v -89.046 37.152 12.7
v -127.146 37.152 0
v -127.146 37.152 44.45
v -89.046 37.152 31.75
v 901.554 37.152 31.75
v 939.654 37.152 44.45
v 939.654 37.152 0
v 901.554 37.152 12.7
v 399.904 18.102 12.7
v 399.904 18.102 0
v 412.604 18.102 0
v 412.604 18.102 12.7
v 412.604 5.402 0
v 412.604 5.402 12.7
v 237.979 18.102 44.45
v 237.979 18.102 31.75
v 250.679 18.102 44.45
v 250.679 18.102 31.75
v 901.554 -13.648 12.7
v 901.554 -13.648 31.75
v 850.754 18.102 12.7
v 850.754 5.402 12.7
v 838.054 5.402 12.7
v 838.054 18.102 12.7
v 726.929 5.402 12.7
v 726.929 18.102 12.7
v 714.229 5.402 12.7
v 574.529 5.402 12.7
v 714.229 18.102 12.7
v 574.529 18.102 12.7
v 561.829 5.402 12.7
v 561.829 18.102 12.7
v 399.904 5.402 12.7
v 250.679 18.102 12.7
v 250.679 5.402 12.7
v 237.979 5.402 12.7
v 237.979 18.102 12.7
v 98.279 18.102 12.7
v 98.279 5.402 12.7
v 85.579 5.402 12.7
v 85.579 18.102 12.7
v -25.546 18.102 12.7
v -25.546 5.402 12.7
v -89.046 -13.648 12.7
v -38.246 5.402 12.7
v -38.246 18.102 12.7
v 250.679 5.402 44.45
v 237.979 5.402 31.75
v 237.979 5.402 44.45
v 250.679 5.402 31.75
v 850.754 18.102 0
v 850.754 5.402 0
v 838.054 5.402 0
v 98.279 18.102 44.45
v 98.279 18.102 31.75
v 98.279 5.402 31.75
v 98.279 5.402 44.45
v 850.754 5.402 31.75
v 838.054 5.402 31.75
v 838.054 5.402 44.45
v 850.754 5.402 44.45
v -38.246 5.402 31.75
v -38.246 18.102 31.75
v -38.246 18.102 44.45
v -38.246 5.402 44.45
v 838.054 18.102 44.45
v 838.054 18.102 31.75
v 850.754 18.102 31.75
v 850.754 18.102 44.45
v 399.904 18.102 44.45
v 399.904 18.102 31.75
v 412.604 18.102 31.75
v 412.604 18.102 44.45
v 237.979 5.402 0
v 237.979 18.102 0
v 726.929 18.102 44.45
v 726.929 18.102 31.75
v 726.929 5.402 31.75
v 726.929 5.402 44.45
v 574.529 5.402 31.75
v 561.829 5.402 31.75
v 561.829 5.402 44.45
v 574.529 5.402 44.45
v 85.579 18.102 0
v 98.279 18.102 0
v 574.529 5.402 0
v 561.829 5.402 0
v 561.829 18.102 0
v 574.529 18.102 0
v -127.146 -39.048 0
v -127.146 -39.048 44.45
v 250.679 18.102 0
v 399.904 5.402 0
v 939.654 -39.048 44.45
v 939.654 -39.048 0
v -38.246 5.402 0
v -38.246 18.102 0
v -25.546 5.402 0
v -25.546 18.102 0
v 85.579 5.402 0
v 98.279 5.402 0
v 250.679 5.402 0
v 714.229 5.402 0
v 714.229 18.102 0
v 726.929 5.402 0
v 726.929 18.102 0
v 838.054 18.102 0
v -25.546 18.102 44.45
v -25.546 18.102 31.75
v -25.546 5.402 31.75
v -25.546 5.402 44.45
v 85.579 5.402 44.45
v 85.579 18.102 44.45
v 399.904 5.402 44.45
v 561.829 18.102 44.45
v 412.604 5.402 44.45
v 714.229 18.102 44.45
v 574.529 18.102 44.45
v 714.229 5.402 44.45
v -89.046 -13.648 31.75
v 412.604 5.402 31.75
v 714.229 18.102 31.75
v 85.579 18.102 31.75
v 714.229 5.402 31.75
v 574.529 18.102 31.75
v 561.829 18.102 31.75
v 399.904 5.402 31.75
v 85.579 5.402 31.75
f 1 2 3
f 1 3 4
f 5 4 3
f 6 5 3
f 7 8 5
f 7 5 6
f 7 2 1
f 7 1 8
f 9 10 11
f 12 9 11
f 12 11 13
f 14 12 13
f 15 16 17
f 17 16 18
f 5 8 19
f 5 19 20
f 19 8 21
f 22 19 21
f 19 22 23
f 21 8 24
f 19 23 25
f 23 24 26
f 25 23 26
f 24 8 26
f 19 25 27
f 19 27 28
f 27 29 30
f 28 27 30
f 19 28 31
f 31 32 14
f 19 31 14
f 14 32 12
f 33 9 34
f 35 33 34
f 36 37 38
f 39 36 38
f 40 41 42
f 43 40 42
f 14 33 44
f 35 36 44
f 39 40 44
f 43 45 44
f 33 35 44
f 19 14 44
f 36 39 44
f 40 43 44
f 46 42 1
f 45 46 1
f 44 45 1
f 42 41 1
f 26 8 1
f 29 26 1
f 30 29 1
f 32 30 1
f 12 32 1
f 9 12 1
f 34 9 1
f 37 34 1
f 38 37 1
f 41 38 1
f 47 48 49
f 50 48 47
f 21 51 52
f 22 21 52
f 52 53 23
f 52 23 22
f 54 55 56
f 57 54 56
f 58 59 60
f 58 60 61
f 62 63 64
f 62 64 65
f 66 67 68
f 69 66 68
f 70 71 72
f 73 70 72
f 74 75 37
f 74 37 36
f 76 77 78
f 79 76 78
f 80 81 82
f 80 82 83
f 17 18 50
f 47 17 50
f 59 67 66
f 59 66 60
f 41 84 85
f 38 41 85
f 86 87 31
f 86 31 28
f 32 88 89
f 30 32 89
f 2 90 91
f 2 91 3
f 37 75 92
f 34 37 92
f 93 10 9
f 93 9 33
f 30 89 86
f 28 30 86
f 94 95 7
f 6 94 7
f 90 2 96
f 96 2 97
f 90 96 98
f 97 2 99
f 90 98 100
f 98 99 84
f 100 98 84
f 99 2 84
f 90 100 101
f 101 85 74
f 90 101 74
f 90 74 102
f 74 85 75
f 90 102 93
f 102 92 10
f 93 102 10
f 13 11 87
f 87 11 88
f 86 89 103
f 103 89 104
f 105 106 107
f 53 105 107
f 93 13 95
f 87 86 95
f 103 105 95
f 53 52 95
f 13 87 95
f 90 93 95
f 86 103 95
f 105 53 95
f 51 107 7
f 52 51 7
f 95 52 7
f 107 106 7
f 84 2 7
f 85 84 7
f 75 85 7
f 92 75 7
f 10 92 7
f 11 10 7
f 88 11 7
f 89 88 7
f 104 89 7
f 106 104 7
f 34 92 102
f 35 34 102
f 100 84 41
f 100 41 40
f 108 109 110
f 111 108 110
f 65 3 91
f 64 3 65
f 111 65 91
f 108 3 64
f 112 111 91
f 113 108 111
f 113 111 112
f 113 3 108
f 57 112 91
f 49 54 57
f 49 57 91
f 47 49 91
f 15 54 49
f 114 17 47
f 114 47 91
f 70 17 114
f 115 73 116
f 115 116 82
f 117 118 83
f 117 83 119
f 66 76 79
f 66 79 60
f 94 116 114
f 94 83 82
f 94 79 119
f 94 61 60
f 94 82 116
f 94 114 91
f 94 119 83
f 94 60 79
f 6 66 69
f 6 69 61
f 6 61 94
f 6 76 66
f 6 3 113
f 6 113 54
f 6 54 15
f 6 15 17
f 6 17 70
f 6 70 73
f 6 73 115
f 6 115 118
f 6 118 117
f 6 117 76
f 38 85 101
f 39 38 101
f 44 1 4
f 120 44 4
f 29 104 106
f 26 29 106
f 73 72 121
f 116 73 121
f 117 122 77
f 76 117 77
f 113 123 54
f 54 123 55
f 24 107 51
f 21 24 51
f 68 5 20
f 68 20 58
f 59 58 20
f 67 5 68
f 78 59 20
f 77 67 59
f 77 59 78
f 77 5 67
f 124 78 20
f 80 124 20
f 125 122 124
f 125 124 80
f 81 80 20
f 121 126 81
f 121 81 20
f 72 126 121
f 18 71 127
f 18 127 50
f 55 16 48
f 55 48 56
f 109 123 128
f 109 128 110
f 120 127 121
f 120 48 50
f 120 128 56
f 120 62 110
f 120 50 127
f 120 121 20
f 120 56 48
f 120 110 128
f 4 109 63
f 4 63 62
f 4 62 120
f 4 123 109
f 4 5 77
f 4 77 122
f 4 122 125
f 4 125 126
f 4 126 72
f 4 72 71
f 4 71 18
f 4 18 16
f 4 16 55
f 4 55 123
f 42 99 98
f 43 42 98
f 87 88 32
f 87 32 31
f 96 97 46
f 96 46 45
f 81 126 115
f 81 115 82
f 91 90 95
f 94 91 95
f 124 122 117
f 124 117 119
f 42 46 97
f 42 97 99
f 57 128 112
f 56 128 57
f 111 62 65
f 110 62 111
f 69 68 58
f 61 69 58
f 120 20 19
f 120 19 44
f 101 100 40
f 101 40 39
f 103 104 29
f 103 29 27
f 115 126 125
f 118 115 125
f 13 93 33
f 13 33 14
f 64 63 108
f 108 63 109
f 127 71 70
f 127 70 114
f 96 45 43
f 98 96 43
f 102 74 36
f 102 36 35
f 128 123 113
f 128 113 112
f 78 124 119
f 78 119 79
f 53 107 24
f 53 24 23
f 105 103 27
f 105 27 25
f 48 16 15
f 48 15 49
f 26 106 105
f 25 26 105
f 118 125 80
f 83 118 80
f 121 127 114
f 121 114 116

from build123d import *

# Parameters (mm, degrees)
F0_W     = 1066.8
F0_H     = 76.2
F1_DEPTH = 44.45
F2_W     = 990.6
F2_H     = 19.05
F3_DEPTH = 50.8
F4_W     = 12.7
F4_H     = 12.7
F5_DEPTH = 44.451


with BuildPart() as f1:
    # F0 (on Top) → F1 (new body)
    with BuildSketch(Plane.XY):
        with Locations((406.253795, -0.947985)):
            Rectangle(F0_W, F0_H)
    extrude(amount=F1_DEPTH)

    # F2 (on face) → F3 (cut)
    with BuildSketch(Plane(origin=(0, 37.152015, 0), x_dir=(-1, 0, 0), z_dir=(0, 1, 0))):
        with Locations((-406.253795, 22.225)):
            Rectangle(F2_W, F2_H)
    extrude(amount=-F3_DEPTH, mode=Mode.SUBTRACT)

    # F4 (on face) → F5 (cut, through all)
    with BuildSketch(Plane(origin=(0, 0, 0), x_dir=(1, 0, 0), z_dir=(0, 0, -1))):
        with Locations((-31.896205, -11.752015)):
            Rectangle(F4_W, F4_H)
        with Locations((91.928795, -11.752015)):
            Rectangle(F4_W, F4_H)
        with Locations((244.328795, -11.752015)):
            Rectangle(F4_W, F4_H)
        with Locations((406.253795, -11.752015)):
            Rectangle(F4_W, F4_H)
        with Locations((568.178795, -11.752015)):
            Rectangle(F4_W, F4_H)
        with Locations((720.578795, -11.752015)):
            Rectangle(F4_W, F4_H)
        with Locations((844.403795, -11.752015)):
            Rectangle(F4_W, F4_H)
    extrude(amount=-F5_DEPTH, mode=Mode.SUBTRACT)


solid = f1.part
